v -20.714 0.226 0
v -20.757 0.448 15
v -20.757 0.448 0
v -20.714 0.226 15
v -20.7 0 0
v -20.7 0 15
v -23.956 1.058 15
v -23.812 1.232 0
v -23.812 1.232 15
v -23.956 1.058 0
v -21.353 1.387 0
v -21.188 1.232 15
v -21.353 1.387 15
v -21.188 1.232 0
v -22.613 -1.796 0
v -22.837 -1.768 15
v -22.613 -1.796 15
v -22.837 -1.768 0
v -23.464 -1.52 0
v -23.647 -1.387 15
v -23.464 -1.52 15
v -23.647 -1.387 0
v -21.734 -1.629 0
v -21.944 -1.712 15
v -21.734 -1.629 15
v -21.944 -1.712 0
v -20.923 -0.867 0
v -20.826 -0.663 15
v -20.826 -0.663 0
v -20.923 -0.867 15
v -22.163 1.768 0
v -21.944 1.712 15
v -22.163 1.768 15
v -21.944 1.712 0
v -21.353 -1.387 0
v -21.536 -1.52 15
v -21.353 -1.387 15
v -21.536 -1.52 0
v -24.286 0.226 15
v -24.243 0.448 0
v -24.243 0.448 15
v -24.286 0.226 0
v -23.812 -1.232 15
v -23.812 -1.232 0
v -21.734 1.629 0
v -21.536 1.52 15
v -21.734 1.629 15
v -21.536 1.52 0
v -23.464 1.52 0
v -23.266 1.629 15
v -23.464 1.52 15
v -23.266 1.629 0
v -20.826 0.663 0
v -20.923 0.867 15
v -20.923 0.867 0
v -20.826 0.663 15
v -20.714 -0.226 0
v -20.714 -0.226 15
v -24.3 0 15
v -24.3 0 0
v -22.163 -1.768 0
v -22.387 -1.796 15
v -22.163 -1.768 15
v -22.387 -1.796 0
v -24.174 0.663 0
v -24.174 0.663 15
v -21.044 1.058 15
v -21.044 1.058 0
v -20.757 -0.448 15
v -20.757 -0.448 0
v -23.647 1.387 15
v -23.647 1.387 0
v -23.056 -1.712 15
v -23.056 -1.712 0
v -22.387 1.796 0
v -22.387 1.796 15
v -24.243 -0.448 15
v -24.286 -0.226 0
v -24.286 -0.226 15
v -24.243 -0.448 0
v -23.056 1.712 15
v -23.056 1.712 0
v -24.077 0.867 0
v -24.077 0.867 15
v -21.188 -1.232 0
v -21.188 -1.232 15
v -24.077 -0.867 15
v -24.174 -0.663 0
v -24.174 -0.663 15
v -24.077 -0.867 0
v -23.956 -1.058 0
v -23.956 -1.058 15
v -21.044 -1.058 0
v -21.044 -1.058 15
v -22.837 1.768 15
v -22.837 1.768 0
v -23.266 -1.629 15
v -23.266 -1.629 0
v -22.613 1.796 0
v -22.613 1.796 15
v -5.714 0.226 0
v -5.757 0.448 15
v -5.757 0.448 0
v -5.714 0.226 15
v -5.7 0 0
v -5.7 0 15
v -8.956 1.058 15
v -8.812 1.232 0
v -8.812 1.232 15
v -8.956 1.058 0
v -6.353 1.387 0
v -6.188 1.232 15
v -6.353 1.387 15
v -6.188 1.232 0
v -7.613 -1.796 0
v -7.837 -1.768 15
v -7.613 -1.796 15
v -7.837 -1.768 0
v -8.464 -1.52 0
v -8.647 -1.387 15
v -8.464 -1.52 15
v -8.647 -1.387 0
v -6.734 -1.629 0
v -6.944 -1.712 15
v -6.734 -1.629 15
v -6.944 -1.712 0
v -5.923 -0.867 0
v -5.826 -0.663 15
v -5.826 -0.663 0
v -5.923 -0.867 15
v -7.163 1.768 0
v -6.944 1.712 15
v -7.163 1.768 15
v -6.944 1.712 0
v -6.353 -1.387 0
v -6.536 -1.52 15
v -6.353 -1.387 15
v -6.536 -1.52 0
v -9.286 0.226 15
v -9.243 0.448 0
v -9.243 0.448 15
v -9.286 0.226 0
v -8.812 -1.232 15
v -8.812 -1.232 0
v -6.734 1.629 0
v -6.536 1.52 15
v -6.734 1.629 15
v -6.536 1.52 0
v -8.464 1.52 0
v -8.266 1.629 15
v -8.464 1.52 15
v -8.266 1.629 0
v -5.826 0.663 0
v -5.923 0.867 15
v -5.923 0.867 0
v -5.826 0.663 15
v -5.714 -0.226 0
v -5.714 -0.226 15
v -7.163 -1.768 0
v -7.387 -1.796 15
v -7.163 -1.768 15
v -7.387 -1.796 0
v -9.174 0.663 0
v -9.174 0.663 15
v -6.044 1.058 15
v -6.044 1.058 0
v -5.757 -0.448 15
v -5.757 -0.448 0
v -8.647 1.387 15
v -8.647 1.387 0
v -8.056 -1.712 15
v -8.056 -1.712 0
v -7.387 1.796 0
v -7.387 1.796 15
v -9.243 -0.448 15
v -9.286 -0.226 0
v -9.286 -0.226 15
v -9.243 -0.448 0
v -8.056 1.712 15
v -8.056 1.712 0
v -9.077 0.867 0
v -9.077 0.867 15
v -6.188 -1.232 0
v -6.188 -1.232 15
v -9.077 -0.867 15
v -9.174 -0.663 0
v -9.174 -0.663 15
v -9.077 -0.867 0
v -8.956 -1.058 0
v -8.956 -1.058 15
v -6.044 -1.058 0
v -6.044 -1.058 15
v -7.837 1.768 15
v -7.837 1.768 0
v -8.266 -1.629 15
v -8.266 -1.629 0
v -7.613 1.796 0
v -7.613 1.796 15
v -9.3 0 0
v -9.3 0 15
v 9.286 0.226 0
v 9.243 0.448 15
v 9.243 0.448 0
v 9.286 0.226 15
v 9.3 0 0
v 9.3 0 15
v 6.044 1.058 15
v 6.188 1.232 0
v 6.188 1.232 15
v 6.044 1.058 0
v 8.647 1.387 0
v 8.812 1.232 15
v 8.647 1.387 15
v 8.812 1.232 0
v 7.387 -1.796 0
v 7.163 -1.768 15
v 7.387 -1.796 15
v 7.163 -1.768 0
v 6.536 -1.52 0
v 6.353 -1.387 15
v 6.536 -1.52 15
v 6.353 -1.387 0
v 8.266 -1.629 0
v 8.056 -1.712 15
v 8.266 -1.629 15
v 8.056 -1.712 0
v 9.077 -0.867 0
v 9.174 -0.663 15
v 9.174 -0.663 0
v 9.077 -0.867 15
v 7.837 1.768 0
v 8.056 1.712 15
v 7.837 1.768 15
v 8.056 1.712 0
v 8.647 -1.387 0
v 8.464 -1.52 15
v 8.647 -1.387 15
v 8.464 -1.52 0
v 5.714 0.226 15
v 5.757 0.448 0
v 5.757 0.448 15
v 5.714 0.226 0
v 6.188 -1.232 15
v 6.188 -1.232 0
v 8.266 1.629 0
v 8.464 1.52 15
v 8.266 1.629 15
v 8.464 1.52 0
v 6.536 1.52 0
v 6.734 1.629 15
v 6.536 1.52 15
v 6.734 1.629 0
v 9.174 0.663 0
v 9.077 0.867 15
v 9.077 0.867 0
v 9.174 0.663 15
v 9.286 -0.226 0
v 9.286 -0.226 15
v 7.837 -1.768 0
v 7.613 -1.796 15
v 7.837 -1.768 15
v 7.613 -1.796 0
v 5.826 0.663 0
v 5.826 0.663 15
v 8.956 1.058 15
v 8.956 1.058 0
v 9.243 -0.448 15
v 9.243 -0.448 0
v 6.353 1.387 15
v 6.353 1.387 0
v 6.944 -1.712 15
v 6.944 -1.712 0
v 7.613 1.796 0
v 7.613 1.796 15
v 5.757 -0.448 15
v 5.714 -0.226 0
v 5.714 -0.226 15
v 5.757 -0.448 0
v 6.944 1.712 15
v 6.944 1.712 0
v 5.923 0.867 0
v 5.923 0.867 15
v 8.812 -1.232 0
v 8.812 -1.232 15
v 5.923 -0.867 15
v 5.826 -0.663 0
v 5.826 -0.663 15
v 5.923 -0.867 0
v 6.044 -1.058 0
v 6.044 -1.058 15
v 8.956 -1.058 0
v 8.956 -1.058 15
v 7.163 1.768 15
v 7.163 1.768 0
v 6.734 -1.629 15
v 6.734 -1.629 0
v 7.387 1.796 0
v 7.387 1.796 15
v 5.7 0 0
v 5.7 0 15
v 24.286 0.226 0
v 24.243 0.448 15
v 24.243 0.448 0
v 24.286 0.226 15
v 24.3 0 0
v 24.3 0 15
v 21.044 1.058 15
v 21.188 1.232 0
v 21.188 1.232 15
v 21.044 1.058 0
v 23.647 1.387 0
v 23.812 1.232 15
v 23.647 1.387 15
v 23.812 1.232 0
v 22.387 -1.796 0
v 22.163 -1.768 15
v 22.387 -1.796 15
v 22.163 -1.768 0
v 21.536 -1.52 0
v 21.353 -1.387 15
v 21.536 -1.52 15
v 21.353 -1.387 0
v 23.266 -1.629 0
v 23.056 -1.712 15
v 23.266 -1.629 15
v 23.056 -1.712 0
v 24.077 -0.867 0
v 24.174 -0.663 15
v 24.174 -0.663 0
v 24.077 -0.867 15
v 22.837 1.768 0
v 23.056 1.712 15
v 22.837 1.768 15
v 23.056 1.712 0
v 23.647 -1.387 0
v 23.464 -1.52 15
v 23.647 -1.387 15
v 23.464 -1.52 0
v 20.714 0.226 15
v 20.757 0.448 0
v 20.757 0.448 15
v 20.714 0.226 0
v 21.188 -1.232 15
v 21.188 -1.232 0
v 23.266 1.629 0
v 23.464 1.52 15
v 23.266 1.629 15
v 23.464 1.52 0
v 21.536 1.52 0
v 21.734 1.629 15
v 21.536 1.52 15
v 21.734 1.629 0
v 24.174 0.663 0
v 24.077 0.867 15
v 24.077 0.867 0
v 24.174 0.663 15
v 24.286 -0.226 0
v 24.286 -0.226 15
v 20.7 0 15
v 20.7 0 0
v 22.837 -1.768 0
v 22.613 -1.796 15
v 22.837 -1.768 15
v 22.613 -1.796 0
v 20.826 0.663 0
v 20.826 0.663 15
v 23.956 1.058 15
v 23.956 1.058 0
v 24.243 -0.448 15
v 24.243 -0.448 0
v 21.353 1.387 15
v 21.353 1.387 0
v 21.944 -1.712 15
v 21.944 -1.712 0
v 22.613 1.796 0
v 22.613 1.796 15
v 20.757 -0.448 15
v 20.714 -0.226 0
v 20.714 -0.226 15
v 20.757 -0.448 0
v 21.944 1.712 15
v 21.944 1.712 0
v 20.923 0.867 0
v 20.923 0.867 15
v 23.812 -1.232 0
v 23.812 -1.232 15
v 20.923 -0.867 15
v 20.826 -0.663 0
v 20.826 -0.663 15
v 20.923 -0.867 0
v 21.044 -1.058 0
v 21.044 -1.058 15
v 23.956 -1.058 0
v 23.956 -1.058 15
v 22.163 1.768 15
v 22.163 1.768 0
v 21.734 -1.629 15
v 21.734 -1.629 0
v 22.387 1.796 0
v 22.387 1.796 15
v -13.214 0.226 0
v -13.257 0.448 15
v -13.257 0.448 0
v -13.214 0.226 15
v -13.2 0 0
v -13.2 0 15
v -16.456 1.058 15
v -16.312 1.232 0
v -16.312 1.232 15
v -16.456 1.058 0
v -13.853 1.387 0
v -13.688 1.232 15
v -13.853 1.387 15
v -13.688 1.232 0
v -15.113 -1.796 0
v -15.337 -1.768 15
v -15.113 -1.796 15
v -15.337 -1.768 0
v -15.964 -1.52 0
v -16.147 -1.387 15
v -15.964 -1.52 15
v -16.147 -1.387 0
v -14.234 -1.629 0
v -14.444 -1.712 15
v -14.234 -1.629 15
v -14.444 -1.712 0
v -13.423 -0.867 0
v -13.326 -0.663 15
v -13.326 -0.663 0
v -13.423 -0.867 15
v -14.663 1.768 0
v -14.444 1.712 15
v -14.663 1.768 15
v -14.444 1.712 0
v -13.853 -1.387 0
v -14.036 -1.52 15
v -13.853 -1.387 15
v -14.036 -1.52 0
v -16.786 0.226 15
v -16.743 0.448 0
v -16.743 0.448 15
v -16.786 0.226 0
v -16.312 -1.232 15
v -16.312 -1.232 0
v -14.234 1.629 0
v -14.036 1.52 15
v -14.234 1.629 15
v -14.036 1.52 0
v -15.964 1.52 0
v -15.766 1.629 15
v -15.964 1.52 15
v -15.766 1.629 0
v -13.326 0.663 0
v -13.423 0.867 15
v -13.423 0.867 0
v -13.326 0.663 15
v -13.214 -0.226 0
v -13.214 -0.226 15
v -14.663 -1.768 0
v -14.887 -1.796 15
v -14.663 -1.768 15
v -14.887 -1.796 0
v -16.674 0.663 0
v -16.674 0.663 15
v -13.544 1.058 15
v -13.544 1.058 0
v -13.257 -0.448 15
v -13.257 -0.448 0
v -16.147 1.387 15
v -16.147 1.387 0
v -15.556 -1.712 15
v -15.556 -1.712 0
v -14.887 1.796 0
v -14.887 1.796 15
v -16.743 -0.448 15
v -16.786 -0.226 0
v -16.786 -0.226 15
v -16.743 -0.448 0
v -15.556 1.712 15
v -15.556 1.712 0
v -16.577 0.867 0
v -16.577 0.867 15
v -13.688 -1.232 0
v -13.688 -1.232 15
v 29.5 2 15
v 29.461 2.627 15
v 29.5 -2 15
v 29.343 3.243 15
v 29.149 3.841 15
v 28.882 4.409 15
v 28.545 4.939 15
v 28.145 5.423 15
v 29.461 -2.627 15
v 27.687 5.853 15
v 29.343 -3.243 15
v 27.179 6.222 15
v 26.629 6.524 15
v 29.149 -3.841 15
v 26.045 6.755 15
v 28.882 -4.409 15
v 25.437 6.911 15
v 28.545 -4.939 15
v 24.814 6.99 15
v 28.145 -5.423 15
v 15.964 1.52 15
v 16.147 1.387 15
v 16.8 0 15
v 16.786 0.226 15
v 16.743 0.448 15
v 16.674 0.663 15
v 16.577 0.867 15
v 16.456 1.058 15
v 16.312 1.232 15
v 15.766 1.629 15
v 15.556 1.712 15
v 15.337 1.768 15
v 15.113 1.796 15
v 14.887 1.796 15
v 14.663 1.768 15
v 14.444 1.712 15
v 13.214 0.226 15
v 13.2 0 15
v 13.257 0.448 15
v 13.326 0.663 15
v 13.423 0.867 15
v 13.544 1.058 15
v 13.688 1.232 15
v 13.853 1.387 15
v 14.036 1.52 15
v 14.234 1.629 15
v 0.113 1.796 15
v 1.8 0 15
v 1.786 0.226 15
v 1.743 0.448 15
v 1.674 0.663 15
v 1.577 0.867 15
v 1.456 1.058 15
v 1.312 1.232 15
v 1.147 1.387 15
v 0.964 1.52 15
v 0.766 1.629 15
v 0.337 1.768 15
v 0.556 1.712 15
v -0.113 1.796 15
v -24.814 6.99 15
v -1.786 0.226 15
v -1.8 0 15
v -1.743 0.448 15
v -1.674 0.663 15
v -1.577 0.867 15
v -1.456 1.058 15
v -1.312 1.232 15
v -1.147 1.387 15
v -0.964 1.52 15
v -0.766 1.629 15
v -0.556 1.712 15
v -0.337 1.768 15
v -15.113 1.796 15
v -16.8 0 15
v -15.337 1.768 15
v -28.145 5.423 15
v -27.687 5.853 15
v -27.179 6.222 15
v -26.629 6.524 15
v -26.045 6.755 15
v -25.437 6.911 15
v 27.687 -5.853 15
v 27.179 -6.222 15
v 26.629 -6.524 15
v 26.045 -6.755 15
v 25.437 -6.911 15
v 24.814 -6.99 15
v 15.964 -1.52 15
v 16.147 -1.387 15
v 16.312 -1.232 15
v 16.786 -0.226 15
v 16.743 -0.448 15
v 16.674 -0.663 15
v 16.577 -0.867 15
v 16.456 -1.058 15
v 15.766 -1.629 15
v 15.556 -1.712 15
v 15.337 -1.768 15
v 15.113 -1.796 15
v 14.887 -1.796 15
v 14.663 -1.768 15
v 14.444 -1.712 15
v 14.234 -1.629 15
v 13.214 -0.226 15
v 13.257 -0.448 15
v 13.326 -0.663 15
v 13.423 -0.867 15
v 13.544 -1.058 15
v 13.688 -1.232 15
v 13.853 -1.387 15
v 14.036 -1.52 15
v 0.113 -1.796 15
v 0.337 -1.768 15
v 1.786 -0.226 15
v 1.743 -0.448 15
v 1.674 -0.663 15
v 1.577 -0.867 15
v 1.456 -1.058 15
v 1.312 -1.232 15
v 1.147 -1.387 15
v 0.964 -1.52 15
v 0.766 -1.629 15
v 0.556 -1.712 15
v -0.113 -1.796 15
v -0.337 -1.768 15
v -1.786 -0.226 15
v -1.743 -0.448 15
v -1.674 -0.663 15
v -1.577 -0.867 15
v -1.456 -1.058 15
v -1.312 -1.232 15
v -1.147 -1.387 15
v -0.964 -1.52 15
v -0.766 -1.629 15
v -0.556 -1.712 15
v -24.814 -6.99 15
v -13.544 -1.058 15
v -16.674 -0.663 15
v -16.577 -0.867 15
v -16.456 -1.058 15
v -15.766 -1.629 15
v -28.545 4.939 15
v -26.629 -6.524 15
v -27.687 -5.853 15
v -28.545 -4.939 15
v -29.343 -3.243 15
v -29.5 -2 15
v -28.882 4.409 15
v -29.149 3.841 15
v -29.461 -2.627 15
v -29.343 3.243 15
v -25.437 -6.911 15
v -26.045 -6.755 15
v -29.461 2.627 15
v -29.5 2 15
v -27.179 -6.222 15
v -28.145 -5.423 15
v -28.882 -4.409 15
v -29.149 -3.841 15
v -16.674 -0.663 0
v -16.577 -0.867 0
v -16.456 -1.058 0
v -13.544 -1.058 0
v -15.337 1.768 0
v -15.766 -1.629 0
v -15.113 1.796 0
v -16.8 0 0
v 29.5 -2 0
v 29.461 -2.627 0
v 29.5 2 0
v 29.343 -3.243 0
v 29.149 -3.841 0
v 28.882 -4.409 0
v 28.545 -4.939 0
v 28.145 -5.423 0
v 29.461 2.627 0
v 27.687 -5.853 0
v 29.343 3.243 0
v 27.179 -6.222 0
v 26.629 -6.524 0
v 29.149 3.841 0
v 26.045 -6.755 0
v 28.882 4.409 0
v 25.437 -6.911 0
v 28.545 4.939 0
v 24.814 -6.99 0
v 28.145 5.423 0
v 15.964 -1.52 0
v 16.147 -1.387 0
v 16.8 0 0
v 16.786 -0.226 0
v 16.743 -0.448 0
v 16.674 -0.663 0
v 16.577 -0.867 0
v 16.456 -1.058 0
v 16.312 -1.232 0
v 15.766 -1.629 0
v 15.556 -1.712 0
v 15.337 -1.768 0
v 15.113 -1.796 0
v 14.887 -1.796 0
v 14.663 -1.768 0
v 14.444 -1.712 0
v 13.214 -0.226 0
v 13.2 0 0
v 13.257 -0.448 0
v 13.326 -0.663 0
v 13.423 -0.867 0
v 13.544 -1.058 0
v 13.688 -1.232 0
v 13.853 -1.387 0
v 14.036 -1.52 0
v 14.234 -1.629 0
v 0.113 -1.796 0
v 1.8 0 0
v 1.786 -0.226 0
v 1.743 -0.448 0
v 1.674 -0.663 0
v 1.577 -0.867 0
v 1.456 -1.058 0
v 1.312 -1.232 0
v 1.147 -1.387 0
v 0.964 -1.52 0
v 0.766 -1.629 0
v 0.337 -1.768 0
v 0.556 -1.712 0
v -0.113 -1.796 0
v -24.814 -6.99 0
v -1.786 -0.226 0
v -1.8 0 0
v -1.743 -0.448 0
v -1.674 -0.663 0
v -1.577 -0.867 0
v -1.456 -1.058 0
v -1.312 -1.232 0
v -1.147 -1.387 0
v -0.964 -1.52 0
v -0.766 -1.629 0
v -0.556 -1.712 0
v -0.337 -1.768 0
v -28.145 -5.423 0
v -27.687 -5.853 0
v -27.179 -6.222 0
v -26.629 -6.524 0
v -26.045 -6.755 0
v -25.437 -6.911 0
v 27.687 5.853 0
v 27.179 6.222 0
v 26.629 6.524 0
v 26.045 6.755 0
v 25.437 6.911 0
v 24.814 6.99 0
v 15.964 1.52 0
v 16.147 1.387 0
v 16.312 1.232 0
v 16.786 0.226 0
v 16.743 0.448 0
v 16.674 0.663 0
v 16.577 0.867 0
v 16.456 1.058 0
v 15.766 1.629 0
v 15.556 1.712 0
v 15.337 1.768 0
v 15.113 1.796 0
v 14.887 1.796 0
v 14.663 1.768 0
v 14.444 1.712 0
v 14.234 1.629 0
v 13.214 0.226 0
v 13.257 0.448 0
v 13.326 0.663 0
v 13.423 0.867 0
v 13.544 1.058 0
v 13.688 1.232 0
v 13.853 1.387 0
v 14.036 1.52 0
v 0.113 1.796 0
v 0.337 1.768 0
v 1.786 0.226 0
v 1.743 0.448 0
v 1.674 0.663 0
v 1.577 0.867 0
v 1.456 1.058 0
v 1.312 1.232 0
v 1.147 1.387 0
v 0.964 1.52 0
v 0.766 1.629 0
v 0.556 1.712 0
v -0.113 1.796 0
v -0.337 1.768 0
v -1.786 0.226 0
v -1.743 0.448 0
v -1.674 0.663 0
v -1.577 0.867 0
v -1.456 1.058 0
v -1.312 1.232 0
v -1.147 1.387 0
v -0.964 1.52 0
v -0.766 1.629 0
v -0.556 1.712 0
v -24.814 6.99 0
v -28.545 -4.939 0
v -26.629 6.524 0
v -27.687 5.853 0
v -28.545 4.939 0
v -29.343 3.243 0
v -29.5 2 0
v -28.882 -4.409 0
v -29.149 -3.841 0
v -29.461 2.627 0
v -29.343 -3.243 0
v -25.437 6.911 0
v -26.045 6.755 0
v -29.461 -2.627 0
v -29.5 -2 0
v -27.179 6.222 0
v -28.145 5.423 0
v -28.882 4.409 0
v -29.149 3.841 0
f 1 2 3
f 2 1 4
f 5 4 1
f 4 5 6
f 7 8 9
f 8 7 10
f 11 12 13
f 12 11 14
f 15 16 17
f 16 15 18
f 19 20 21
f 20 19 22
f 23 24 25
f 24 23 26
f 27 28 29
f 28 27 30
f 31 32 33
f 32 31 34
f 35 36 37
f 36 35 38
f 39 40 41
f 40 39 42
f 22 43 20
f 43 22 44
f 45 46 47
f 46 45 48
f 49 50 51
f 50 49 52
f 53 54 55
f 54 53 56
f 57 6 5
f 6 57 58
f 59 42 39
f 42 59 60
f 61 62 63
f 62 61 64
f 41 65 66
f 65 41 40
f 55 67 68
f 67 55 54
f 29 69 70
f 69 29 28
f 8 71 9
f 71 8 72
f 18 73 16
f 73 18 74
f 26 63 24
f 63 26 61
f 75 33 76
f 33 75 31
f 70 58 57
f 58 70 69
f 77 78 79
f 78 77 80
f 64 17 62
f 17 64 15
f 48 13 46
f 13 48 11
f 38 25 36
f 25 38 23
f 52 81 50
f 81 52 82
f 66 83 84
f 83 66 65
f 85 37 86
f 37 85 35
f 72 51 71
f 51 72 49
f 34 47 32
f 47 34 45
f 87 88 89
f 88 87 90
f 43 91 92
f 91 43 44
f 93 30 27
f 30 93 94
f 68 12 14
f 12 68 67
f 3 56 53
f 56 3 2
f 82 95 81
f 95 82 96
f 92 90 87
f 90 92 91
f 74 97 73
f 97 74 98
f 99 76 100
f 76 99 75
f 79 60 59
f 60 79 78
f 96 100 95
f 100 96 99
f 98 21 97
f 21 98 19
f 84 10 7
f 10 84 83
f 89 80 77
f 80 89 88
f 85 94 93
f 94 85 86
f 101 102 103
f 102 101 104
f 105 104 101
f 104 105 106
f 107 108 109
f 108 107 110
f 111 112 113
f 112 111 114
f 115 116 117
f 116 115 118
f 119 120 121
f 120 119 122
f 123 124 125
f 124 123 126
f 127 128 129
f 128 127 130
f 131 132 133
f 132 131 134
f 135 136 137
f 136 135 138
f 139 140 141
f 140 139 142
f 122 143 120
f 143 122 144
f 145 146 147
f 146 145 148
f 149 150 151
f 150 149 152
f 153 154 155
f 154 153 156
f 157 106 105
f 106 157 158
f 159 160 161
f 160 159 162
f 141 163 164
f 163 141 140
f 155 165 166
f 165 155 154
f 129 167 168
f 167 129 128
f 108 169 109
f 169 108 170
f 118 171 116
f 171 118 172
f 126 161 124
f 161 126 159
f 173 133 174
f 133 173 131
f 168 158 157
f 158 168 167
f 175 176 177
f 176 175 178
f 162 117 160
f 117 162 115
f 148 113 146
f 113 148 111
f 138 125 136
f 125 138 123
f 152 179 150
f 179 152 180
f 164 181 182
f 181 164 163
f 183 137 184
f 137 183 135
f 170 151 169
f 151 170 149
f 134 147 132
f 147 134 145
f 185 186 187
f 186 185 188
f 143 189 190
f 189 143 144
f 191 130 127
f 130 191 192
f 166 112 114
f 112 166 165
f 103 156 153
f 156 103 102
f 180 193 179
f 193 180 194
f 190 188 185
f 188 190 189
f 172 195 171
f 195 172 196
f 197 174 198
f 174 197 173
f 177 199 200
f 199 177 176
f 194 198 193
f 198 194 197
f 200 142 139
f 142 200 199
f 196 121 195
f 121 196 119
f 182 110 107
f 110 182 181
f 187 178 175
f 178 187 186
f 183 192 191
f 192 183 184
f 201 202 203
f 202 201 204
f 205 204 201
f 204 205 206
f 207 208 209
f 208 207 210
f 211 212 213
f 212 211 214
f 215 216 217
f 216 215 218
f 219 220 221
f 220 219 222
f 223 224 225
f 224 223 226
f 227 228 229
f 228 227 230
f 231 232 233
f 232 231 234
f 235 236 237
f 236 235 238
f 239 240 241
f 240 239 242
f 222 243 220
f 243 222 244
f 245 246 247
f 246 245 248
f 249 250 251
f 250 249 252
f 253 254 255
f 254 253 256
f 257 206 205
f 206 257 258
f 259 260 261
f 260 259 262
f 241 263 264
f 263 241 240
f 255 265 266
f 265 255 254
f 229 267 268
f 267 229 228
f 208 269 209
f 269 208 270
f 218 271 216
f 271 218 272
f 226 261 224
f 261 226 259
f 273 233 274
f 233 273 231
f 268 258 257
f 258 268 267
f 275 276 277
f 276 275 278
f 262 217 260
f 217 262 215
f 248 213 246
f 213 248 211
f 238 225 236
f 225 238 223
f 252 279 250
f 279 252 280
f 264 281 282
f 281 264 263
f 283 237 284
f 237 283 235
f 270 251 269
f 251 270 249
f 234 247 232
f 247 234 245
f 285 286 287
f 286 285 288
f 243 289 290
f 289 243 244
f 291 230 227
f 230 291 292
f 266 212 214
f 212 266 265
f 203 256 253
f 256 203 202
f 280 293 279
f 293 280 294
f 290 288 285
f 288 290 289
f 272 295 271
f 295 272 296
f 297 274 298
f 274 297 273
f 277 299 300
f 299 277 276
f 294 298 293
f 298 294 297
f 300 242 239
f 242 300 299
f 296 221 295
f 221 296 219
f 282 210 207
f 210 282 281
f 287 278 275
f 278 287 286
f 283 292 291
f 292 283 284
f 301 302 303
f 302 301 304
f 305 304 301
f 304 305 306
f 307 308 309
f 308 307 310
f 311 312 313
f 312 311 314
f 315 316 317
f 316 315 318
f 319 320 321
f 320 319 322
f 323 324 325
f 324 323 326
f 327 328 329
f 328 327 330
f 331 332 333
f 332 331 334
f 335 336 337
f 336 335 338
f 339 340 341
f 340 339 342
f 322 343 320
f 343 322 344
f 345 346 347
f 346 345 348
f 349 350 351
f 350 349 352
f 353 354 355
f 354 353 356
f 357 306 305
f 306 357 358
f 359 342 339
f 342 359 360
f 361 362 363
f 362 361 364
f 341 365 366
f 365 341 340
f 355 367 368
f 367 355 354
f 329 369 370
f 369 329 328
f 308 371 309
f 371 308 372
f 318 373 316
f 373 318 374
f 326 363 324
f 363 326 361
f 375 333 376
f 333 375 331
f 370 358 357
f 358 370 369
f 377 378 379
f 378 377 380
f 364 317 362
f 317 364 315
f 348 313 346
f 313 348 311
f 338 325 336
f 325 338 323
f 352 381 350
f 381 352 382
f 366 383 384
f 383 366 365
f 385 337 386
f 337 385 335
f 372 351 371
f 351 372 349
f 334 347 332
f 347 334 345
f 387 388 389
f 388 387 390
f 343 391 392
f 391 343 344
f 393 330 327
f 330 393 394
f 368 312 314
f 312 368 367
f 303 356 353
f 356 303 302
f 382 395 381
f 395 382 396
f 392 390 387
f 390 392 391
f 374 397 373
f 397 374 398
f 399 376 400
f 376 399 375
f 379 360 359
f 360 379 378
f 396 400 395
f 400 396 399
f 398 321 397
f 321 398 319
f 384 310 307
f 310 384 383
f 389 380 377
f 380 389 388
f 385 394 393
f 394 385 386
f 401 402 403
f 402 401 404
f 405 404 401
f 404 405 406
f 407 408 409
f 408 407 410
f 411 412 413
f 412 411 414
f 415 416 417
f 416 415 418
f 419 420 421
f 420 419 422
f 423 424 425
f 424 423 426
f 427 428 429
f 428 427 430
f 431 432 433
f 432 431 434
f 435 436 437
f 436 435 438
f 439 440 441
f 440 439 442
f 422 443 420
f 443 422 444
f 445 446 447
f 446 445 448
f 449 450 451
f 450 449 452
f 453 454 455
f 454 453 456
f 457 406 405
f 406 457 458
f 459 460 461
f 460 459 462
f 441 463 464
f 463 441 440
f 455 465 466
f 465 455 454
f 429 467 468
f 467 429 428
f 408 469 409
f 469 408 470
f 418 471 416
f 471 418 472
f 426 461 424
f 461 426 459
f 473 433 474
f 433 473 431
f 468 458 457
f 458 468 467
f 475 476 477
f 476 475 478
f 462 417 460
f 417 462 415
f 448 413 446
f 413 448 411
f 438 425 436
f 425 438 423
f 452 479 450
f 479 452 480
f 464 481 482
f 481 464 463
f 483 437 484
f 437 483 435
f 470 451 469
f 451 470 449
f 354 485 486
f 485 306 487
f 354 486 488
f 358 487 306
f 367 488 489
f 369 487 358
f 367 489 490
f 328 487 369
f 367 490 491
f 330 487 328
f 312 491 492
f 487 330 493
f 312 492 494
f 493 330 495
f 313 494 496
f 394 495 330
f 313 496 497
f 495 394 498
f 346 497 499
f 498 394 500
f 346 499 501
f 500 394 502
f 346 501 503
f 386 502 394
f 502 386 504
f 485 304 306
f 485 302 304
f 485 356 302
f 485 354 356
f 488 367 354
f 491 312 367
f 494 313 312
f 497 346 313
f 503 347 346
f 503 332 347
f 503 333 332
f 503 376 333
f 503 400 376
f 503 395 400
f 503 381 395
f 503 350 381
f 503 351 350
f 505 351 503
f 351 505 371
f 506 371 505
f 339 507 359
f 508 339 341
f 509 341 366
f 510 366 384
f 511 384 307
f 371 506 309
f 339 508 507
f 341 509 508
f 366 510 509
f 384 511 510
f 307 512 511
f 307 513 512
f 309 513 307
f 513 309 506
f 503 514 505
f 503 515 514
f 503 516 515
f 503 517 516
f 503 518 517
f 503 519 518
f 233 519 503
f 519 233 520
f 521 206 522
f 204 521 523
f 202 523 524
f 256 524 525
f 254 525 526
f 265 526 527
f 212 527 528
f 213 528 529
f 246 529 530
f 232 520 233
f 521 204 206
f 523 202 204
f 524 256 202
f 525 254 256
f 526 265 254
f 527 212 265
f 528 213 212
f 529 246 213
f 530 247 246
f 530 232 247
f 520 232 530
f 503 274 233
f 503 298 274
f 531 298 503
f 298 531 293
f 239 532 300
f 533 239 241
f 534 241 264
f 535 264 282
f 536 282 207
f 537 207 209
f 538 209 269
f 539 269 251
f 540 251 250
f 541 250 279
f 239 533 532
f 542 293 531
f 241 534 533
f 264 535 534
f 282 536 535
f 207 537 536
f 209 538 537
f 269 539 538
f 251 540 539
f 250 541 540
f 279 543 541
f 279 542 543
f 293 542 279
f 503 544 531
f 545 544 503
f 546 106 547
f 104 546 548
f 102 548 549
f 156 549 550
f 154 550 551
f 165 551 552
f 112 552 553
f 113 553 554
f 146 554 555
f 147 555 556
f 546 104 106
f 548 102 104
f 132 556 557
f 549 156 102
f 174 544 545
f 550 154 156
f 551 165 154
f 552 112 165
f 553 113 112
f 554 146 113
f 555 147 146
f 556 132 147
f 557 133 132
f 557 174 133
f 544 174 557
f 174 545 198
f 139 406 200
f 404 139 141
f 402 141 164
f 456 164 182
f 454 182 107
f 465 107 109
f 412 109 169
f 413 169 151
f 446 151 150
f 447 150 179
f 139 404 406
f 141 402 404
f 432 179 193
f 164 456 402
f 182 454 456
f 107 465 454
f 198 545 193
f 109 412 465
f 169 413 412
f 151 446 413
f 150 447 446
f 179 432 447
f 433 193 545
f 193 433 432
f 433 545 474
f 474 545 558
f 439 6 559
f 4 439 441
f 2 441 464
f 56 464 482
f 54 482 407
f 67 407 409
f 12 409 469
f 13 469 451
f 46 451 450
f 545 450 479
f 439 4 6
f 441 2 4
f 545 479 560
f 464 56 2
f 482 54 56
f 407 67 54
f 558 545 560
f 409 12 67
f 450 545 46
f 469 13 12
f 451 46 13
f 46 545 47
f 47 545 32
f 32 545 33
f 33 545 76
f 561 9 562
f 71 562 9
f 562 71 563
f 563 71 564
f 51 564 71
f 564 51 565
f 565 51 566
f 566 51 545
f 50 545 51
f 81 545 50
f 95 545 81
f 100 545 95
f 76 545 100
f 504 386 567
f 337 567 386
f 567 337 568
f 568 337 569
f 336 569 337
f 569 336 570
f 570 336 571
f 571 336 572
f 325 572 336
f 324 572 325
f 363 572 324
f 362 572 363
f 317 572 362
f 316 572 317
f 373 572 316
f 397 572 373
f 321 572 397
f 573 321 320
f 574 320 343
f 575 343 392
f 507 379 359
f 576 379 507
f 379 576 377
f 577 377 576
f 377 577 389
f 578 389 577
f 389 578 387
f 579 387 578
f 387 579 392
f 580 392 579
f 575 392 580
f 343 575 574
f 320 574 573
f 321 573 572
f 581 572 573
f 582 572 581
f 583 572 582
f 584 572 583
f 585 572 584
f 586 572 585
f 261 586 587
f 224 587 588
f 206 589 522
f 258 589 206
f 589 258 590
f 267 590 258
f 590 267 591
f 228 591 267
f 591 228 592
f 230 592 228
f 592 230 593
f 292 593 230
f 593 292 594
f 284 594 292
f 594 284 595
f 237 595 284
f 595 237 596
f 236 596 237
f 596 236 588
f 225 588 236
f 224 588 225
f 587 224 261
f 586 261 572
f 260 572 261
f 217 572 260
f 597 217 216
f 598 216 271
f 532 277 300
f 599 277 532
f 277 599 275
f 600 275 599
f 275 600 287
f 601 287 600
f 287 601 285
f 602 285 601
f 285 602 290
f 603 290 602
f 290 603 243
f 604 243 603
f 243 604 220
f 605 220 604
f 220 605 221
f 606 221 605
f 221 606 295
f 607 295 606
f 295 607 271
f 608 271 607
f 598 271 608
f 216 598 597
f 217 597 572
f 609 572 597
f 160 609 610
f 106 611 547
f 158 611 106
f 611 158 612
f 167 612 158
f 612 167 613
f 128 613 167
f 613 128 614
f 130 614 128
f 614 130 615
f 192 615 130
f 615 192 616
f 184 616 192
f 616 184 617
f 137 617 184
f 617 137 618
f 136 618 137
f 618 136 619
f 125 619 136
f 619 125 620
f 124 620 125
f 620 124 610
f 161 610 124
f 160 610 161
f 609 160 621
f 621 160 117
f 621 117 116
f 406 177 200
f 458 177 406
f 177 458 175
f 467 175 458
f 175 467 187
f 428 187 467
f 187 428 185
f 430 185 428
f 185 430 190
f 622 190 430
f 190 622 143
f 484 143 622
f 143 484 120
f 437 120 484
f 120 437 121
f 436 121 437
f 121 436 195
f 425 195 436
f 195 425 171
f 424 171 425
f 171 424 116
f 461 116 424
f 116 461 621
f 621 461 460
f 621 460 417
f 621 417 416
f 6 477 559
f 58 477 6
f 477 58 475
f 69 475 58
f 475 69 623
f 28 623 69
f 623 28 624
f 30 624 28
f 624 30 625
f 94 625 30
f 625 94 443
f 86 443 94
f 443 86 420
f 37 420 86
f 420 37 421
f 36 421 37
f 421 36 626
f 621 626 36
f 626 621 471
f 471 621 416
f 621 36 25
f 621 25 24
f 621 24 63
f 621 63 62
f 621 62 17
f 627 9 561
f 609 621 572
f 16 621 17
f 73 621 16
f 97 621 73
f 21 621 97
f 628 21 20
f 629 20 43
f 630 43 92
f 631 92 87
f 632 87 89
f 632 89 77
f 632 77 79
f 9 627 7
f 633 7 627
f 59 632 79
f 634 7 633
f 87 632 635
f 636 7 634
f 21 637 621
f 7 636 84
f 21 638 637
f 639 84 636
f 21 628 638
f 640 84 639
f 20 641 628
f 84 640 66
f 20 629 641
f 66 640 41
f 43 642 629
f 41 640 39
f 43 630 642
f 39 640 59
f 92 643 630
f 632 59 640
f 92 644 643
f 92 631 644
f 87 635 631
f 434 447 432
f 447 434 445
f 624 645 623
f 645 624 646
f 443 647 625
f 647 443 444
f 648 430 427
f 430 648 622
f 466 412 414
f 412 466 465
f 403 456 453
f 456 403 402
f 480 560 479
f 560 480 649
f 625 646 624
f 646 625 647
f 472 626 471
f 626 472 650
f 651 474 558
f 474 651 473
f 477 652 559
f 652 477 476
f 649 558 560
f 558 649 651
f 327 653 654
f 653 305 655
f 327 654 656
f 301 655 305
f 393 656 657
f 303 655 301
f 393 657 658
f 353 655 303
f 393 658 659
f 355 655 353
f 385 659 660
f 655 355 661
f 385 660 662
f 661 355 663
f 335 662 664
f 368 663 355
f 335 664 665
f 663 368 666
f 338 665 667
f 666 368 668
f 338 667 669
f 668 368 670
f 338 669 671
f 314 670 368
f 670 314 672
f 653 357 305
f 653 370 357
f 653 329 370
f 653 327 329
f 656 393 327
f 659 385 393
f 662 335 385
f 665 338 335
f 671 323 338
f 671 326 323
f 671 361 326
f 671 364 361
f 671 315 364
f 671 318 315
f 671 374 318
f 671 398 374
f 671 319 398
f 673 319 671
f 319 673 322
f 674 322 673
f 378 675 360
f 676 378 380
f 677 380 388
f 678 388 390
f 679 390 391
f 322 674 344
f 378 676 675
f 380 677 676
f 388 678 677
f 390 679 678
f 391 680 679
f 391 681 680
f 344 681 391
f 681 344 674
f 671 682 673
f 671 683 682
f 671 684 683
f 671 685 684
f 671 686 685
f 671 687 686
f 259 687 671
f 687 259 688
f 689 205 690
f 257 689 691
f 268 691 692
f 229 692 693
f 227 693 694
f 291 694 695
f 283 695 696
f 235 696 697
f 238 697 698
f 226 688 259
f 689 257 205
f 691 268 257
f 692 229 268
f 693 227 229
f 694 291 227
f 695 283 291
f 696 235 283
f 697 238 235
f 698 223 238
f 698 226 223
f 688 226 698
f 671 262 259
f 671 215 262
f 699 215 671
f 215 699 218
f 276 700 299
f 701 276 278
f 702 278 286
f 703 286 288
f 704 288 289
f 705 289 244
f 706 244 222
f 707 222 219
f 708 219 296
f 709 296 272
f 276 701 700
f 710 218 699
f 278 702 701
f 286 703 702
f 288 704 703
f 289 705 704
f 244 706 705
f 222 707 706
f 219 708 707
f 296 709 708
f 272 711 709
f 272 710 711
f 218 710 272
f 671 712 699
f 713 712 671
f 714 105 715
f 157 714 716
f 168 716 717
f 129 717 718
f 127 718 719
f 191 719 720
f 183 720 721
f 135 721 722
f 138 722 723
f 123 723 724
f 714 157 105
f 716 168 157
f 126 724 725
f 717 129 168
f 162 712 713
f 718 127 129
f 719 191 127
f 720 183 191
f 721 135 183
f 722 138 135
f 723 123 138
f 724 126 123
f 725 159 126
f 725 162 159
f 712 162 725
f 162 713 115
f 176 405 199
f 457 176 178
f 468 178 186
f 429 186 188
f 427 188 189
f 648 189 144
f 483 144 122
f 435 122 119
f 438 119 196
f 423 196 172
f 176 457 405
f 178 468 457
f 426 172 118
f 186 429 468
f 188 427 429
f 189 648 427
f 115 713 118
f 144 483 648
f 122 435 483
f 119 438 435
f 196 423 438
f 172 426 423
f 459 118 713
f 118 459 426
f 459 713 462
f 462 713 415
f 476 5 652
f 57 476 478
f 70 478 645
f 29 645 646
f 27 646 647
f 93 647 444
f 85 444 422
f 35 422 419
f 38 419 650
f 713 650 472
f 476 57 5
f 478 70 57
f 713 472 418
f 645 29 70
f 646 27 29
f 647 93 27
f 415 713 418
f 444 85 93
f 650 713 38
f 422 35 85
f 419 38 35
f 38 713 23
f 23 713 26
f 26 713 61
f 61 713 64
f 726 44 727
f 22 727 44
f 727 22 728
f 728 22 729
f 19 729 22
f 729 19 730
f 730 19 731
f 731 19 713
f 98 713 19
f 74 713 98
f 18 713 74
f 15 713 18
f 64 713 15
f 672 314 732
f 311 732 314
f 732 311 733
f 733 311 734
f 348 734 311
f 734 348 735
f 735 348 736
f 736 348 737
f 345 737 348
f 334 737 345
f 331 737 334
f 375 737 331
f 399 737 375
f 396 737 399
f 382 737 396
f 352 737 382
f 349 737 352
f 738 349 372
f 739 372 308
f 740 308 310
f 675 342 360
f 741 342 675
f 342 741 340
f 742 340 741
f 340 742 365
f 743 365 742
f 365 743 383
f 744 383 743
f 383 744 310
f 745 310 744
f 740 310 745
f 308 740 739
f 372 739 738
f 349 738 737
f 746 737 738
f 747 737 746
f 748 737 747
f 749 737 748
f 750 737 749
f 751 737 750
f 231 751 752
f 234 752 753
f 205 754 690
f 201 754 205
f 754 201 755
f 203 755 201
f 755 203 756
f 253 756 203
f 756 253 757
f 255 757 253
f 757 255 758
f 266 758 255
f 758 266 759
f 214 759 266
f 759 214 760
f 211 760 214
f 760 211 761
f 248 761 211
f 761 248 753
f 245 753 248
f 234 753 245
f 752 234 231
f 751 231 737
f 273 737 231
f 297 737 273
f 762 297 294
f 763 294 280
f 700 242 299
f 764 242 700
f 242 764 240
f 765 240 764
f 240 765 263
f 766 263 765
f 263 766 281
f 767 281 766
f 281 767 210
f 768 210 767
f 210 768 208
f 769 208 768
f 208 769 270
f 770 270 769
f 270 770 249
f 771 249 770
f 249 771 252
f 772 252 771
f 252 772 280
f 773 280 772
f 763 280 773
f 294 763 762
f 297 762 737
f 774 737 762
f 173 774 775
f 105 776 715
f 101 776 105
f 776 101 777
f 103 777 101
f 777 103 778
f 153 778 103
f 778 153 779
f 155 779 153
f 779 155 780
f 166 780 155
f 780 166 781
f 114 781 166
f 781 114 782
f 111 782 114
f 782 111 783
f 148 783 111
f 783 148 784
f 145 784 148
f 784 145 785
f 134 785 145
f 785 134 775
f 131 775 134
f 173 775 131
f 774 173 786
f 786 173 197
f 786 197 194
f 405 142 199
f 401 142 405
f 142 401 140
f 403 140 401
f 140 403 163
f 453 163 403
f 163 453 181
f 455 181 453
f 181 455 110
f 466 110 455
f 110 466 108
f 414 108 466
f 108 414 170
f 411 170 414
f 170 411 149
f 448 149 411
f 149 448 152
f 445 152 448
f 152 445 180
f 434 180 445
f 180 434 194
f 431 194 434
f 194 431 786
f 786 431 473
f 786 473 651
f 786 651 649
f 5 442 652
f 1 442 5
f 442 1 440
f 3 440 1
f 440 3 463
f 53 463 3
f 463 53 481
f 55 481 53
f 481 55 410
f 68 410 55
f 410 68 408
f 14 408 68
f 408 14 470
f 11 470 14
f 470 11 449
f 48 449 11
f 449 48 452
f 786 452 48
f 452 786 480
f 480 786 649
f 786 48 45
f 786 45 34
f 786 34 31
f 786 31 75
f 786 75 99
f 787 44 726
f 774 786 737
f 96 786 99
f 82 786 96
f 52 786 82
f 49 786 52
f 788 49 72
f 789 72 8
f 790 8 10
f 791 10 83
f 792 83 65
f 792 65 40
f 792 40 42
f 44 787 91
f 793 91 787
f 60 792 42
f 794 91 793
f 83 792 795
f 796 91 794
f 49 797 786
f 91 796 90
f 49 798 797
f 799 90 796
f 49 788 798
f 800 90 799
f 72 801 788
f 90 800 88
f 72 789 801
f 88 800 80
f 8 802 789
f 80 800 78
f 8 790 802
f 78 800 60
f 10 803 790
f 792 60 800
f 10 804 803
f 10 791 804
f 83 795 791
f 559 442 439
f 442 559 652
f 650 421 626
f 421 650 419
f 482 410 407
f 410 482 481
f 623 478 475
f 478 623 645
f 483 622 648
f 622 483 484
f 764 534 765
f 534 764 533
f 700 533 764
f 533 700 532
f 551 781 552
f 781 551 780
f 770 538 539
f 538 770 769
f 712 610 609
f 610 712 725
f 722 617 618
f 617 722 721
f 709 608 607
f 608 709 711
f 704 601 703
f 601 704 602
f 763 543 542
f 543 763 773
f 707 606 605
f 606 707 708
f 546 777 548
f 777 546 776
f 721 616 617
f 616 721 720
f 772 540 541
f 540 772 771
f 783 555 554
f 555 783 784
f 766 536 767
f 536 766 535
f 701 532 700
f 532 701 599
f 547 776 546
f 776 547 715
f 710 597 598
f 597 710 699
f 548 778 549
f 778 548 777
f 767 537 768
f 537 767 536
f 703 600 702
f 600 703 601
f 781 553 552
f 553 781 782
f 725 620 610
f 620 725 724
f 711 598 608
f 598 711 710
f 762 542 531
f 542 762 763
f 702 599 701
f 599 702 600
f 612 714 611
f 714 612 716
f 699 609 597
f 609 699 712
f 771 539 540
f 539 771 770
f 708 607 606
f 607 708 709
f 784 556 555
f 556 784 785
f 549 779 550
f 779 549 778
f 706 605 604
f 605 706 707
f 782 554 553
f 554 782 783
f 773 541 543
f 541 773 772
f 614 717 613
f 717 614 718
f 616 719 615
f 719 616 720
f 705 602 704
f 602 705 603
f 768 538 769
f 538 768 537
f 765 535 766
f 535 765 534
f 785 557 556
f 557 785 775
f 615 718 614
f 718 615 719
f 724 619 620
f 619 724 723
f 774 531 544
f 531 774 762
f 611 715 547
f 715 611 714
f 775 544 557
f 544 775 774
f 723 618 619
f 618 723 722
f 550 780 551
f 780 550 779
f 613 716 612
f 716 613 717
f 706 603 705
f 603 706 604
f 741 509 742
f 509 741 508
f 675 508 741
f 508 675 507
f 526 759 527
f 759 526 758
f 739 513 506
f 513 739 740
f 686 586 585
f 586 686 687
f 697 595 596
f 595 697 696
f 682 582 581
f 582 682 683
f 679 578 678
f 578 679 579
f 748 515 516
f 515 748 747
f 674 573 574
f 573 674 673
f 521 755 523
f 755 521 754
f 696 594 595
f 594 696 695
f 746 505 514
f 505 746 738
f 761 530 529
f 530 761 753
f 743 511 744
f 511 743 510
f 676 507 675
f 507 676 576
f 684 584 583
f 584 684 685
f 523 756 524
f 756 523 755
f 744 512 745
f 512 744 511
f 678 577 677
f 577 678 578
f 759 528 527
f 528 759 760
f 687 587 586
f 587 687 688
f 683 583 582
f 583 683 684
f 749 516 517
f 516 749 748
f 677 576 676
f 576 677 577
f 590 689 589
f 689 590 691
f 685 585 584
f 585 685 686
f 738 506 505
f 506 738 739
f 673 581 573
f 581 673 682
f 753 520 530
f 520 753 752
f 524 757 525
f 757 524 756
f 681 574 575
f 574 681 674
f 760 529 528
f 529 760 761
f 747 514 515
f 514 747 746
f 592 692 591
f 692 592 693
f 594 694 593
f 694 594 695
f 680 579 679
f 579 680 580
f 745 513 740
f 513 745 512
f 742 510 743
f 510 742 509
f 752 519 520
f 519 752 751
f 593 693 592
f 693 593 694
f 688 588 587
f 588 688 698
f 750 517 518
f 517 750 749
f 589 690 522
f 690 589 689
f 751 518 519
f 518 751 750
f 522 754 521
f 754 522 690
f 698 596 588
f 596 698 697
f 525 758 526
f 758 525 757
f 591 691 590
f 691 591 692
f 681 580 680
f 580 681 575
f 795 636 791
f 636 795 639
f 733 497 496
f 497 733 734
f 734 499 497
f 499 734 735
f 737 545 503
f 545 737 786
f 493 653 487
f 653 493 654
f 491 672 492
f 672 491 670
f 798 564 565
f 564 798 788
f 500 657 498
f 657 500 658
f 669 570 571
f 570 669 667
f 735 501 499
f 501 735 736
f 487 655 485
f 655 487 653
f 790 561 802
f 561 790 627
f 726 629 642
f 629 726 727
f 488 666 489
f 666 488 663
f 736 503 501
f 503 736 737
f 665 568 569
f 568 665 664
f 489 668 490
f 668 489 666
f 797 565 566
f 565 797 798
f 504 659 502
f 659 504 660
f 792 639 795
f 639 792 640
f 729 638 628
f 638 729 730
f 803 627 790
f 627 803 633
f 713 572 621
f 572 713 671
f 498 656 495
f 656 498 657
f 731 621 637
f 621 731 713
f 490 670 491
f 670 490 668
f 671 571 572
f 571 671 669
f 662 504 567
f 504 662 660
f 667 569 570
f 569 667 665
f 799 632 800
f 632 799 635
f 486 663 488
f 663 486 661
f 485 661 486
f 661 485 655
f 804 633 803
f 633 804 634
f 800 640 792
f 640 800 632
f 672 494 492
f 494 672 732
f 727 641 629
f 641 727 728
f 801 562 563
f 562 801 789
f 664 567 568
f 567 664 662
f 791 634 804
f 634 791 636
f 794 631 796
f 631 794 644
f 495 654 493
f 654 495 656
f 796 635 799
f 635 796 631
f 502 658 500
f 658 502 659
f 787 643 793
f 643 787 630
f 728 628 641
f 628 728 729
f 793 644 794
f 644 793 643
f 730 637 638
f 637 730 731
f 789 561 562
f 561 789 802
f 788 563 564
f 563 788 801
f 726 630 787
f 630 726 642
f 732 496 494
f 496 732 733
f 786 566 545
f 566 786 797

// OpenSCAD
$fn = 50;


difference() {
	union() {
		hull() {
			translate(v = [-24.5000000000, 2.0000000000, 0]) {
				cylinder(h = 15, r = 5);
			}
			translate(v = [24.5000000000, 2.0000000000, 0]) {
				cylinder(h = 15, r = 5);
			}
			translate(v = [-24.5000000000, -2.0000000000, 0]) {
				cylinder(h = 15, r = 5);
			}
			translate(v = [24.5000000000, -2.0000000000, 0]) {
				cylinder(h = 15, r = 5);
			}
		}
	}
	union() {
		translate(v = [-22.5000000000, 0.0000000000, -100.0000000000]) {
			cylinder(h = 200, r = 1.8000000000);
		}
		translate(v = [-7.5000000000, 0.0000000000, -100.0000000000]) {
			cylinder(h = 200, r = 1.8000000000);
		}
		translate(v = [7.5000000000, 0.0000000000, -100.0000000000]) {
			cylinder(h = 200, r = 1.8000000000);
		}
		translate(v = [22.5000000000, 0.0000000000, -100.0000000000]) {
			cylinder(h = 200, r = 1.8000000000);
		}
		translate(v = [-22.5000000000, 0.0000000000, 0]) {
			cylinder(h = 15, r = 1.8000000000);
		}
		translate(v = [-15.0000000000, 0.0000000000, 0]) {
			cylinder(h = 15, r = 1.8000000000);
		}
		translate(v = [-7.5000000000, 0.0000000000, 0]) {
			cylinder(h = 15, r = 1.8000000000);
		}
		cylinder(h = 15, r = 1.8000000000);
		translate(v = [7.5000000000, 0.0000000000, 0]) {
			cylinder(h = 15, r = 1.8000000000);
		}
		translate(v = [15.0000000000, 0.0000000000, 0]) {
			cylinder(h = 15, r = 1.8000000000);
		}
		translate(v = [22.5000000000, 0.0000000000, 0]) {
			cylinder(h = 15, r = 1.8000000000);
		}
		translate(v = [-22.5000000000, 0.0000000000, 0]) {
			cylinder(h = 15, r = 1.8000000000);
		}
		translate(v = [-15.0000000000, 0.0000000000, 0]) {
			cylinder(h = 15, r = 1.8000000000);
		}
		translate(v = [-7.5000000000, 0.0000000000, 0]) {
			cylinder(h = 15, r = 1.8000000000);
		}
		cylinder(h = 15, r = 1.8000000000);
		translate(v = [7.5000000000, 0.0000000000, 0]) {
			cylinder(h = 15, r = 1.8000000000);
		}
		translate(v = [15.0000000000, 0.0000000000, 0]) {
			cylinder(h = 15, r = 1.8000000000);
		}
		translate(v = [22.5000000000, 0.0000000000, 0]) {
			cylinder(h = 15, r = 1.8000000000);
		}
		translate(v = [-22.5000000000, 0.0000000000, 0]) {
			cylinder(h = 15, r = 1.8000000000);
		}
		translate(v = [-15.0000000000, 0.0000000000, 0]) {
			cylinder(h = 15, r = 1.8000000000);
		}
		translate(v = [-7.5000000000, 0.0000000000, 0]) {
			cylinder(h = 15, r = 1.8000000000);
		}
		cylinder(h = 15, r = 1.8000000000);
		translate(v = [7.5000000000, 0.0000000000, 0]) {
			cylinder(h = 15, r = 1.8000000000);
		}
		translate(v = [15.0000000000, 0.0000000000, 0]) {
			cylinder(h = 15, r = 1.8000000000);
		}
		translate(v = [22.5000000000, 0.0000000000, 0]) {
			cylinder(h = 15, r = 1.8000000000);
		}
	}
}
